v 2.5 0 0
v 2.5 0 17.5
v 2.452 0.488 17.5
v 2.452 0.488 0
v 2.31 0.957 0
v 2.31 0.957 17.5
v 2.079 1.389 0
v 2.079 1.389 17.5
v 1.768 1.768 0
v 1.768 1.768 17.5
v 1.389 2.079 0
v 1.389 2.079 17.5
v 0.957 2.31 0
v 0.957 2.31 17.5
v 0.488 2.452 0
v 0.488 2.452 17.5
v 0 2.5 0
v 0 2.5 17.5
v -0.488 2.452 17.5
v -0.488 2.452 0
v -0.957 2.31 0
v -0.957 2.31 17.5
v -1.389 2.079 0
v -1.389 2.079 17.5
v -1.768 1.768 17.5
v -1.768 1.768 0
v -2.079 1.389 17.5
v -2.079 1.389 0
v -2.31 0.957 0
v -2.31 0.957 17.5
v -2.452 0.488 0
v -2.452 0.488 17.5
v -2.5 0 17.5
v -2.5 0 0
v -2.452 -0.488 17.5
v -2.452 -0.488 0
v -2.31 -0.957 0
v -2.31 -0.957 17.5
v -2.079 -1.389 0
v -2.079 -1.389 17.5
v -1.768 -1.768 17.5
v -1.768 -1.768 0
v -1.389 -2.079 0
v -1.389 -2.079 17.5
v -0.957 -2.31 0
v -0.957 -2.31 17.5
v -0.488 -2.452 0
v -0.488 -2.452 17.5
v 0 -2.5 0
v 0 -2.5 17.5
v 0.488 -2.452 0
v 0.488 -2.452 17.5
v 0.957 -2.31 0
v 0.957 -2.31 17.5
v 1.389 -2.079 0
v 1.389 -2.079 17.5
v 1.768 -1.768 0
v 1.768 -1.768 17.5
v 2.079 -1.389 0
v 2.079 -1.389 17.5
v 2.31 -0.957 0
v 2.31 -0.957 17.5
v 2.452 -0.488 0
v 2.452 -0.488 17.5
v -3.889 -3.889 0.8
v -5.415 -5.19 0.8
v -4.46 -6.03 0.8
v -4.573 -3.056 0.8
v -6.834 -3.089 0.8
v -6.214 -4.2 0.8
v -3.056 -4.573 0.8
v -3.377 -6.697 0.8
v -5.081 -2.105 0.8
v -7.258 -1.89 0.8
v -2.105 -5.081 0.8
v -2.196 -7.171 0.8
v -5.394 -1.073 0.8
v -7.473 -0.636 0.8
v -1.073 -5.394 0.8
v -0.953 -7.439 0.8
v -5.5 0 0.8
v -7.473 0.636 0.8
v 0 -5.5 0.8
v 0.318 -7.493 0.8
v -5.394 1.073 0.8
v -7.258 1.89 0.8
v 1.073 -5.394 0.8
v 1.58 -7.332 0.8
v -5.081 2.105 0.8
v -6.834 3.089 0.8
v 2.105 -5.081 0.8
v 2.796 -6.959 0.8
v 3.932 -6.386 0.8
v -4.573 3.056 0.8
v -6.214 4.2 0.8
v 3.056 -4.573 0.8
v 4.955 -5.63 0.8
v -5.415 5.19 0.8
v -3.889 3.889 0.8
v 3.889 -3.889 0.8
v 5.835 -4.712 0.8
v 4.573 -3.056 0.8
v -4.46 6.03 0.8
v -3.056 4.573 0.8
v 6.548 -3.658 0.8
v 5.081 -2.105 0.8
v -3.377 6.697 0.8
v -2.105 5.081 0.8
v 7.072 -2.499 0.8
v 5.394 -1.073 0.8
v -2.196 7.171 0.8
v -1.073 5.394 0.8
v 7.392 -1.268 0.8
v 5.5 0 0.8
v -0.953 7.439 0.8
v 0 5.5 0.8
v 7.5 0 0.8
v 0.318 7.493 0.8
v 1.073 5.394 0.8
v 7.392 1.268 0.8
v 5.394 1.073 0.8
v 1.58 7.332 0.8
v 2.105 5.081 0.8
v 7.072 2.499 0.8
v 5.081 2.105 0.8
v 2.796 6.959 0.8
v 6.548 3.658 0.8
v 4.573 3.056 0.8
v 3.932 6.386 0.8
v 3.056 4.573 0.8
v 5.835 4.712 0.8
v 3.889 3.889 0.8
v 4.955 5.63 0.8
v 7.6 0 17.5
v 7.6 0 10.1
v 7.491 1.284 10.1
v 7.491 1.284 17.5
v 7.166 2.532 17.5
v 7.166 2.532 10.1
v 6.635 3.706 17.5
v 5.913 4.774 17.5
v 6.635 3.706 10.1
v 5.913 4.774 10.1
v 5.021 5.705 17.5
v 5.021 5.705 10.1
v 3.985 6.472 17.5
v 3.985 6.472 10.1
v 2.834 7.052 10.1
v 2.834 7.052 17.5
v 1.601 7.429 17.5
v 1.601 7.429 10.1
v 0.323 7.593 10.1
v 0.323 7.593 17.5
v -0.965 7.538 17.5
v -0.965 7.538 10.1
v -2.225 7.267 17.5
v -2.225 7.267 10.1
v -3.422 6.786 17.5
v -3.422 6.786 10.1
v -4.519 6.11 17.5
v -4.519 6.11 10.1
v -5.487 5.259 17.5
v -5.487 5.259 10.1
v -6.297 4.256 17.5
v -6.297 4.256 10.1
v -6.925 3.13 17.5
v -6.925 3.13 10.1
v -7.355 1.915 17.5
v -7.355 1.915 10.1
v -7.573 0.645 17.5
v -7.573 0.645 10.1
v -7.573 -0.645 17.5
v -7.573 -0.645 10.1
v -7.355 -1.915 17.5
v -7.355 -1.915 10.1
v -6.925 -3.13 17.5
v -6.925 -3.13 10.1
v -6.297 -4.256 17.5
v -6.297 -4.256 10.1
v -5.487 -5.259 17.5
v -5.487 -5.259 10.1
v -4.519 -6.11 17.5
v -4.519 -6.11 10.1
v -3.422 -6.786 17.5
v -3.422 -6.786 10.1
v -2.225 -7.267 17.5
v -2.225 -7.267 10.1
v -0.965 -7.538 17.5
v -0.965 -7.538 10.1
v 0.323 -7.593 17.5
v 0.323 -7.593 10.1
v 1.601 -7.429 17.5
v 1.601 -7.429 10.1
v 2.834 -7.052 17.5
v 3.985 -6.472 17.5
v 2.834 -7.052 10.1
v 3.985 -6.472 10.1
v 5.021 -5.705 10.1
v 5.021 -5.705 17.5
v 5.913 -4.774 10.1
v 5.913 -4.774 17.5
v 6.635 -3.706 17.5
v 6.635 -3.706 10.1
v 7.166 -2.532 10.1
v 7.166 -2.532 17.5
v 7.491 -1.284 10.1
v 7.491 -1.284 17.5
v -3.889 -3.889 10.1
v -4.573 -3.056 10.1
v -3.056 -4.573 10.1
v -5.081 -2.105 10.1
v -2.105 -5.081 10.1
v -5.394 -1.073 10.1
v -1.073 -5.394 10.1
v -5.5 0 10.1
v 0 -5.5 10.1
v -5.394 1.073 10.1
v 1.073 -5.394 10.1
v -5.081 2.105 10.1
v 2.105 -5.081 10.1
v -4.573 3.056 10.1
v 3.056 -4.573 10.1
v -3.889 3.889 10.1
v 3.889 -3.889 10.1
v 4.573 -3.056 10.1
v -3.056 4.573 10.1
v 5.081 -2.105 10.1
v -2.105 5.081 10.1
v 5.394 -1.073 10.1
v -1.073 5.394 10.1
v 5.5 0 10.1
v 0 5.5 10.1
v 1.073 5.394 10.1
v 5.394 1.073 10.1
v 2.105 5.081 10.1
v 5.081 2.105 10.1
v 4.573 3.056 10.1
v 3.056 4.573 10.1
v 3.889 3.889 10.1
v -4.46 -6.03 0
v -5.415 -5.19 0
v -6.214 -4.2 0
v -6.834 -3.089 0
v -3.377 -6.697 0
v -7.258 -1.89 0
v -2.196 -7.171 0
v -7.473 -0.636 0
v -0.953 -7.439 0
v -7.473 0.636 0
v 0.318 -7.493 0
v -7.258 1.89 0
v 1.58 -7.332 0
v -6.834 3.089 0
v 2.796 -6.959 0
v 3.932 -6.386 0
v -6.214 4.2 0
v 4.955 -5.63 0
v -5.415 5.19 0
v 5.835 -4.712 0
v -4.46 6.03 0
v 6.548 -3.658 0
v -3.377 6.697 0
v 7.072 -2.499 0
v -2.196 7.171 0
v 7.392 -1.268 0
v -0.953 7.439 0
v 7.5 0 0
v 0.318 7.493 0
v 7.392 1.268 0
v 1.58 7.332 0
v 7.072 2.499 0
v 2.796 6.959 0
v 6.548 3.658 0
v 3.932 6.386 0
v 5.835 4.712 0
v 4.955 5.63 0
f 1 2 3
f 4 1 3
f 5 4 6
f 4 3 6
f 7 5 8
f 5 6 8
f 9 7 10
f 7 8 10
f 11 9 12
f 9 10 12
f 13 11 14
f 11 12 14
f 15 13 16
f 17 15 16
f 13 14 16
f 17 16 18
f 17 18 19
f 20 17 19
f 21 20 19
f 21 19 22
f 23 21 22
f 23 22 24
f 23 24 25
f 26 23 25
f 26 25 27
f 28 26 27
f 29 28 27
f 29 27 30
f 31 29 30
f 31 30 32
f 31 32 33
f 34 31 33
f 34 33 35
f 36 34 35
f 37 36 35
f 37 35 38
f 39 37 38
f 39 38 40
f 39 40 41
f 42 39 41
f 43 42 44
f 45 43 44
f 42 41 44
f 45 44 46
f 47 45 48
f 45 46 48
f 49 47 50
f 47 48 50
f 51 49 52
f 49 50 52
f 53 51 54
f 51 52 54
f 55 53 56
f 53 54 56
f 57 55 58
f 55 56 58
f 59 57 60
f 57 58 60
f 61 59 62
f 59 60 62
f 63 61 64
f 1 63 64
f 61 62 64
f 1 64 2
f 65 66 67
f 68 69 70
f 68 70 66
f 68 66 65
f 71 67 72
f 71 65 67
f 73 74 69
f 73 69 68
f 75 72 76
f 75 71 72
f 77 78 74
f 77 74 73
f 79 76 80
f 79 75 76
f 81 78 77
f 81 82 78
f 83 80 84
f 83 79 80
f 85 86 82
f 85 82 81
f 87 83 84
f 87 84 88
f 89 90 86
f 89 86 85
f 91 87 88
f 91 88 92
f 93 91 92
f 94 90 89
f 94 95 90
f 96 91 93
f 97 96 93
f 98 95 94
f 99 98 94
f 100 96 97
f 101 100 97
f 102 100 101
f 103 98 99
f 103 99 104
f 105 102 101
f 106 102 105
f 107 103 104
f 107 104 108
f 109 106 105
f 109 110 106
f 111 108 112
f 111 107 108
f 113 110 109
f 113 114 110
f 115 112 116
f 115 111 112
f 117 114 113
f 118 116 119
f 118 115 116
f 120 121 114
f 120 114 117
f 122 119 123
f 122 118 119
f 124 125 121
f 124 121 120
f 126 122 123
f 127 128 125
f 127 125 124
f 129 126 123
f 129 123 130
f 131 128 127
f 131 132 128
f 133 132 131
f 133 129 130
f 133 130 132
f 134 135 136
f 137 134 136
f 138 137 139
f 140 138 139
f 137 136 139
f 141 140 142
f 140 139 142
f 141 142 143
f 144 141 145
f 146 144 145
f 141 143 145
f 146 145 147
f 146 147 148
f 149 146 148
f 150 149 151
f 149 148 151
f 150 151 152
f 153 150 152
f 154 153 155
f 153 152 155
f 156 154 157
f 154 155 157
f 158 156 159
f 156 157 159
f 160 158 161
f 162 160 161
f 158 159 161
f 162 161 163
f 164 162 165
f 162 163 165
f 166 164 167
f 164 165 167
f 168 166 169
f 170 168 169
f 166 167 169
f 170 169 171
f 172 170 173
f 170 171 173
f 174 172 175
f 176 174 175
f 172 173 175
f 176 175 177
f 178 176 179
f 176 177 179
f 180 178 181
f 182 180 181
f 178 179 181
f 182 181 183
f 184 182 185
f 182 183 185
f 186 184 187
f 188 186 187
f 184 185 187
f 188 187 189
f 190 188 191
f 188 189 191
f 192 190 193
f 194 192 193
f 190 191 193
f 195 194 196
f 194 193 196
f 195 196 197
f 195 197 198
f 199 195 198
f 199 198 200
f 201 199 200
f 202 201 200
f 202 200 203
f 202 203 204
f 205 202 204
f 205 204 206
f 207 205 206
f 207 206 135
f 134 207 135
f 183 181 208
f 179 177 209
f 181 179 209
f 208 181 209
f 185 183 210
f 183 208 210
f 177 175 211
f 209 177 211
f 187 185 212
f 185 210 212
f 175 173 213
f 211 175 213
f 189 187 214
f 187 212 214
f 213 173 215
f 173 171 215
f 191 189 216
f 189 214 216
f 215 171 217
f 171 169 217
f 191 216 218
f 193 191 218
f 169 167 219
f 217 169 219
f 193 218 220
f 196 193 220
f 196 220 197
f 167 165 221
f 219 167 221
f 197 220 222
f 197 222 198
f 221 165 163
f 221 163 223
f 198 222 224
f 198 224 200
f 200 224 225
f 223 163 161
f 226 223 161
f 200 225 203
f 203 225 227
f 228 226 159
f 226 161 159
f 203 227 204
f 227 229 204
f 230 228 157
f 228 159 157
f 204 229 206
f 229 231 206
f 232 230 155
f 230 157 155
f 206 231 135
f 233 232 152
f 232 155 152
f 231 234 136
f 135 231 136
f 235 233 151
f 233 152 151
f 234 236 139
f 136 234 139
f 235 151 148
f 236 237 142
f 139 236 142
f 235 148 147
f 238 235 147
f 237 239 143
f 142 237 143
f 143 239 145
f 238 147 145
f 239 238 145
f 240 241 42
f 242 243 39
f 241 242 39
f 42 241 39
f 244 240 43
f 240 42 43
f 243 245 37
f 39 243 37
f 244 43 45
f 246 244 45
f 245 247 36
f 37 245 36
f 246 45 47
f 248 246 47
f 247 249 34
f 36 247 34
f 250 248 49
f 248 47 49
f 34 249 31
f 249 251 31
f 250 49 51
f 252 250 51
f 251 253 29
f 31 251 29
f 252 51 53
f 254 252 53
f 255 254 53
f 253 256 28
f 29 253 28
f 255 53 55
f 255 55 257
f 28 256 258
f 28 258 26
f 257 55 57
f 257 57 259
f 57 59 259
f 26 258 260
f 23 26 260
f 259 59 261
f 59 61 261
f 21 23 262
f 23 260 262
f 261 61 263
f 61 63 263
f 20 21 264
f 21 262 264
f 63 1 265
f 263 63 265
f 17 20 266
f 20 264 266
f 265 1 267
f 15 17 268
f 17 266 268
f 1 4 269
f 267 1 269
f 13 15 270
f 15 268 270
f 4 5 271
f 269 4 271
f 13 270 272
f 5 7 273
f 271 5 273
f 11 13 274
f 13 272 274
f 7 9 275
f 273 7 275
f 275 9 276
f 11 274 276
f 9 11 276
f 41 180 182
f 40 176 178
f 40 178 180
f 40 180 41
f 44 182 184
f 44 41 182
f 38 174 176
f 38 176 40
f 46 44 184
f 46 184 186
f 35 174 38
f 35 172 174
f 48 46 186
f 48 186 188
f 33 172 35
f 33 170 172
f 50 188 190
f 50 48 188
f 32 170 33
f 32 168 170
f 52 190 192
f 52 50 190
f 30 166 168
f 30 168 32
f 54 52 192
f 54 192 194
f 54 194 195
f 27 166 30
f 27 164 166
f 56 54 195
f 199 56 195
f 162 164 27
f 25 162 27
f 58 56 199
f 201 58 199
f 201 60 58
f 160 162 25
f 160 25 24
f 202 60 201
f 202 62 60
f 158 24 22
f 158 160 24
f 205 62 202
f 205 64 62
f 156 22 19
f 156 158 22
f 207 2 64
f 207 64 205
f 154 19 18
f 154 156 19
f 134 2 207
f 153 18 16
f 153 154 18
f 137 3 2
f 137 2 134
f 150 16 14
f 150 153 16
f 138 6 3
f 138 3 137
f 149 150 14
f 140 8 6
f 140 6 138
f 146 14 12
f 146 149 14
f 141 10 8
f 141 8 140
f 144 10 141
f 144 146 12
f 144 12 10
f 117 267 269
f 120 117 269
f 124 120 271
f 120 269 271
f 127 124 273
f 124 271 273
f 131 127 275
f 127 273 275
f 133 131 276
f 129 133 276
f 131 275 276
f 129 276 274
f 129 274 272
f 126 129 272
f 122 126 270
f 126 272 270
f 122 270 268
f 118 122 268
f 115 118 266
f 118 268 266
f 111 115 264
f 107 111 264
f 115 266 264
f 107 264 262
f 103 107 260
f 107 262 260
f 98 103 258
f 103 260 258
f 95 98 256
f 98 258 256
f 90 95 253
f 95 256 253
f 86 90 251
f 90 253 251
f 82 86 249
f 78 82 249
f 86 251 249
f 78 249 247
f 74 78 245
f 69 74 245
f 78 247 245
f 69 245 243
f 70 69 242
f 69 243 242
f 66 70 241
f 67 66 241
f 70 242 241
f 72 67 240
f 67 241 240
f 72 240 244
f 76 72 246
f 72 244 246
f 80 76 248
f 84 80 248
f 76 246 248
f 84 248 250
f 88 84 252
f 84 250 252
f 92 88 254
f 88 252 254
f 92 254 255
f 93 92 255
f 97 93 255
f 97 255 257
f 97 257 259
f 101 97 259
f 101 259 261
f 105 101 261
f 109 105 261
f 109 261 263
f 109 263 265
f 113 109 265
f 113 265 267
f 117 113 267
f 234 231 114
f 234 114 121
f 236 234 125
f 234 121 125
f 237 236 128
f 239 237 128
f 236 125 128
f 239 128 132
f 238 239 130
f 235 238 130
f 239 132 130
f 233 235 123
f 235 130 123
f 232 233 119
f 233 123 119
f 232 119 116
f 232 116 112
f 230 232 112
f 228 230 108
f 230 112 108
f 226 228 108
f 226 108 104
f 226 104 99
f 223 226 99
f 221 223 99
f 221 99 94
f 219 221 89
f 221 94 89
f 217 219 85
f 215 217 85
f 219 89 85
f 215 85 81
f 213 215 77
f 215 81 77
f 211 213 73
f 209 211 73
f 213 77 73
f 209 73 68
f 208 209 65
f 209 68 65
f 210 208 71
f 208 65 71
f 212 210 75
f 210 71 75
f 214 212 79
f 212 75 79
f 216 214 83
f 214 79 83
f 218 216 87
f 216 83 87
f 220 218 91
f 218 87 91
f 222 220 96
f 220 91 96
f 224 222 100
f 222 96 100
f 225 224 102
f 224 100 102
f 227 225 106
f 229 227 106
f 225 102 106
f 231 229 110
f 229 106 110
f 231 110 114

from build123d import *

# Parameters (mm, degrees)
SKETCH_1_R          = 7.5
EXTRUDE_1_DEPTH     = 0.8
SKETCH_2_R          = 5.5
EXTRUDE_2_DEPTH     = 9.3
SKETCH_3_R          = 7.6
EXTRUDE_3_DEPTH     = 7.4
SKETCH_4_R          = 2.5
CUT_EXTRUDE_1_DEPTH = 21.537039709


with BuildPart() as part:
    # Эскиз1 → Бобышка-Вытянуть1 (new body)
    with BuildSketch(Plane.XY):
        Circle(SKETCH_1_R)
    extrude(amount=EXTRUDE_1_DEPTH)

    # Эскиз2 → Бобышка-Вытянуть2 (add)
    with BuildSketch(Plane.XY.offset(0.8)):
        Circle(SKETCH_2_R)
    extrude(amount=EXTRUDE_2_DEPTH)

    # Эскиз3 → Бобышка-Вытянуть3 (add)
    with BuildSketch(Plane.XY.offset(10.1)):
        Circle(SKETCH_3_R)
    extrude(amount=EXTRUDE_3_DEPTH)

    # Эскиз4 → Вырез-Вытянуть1 (cut, through all)
    with BuildSketch(Plane.XY.offset(17.5)):
        Circle(SKETCH_4_R)
    extrude(amount=-CUT_EXTRUDE_1_DEPTH, mode=Mode.SUBTRACT)


solid = part.part
